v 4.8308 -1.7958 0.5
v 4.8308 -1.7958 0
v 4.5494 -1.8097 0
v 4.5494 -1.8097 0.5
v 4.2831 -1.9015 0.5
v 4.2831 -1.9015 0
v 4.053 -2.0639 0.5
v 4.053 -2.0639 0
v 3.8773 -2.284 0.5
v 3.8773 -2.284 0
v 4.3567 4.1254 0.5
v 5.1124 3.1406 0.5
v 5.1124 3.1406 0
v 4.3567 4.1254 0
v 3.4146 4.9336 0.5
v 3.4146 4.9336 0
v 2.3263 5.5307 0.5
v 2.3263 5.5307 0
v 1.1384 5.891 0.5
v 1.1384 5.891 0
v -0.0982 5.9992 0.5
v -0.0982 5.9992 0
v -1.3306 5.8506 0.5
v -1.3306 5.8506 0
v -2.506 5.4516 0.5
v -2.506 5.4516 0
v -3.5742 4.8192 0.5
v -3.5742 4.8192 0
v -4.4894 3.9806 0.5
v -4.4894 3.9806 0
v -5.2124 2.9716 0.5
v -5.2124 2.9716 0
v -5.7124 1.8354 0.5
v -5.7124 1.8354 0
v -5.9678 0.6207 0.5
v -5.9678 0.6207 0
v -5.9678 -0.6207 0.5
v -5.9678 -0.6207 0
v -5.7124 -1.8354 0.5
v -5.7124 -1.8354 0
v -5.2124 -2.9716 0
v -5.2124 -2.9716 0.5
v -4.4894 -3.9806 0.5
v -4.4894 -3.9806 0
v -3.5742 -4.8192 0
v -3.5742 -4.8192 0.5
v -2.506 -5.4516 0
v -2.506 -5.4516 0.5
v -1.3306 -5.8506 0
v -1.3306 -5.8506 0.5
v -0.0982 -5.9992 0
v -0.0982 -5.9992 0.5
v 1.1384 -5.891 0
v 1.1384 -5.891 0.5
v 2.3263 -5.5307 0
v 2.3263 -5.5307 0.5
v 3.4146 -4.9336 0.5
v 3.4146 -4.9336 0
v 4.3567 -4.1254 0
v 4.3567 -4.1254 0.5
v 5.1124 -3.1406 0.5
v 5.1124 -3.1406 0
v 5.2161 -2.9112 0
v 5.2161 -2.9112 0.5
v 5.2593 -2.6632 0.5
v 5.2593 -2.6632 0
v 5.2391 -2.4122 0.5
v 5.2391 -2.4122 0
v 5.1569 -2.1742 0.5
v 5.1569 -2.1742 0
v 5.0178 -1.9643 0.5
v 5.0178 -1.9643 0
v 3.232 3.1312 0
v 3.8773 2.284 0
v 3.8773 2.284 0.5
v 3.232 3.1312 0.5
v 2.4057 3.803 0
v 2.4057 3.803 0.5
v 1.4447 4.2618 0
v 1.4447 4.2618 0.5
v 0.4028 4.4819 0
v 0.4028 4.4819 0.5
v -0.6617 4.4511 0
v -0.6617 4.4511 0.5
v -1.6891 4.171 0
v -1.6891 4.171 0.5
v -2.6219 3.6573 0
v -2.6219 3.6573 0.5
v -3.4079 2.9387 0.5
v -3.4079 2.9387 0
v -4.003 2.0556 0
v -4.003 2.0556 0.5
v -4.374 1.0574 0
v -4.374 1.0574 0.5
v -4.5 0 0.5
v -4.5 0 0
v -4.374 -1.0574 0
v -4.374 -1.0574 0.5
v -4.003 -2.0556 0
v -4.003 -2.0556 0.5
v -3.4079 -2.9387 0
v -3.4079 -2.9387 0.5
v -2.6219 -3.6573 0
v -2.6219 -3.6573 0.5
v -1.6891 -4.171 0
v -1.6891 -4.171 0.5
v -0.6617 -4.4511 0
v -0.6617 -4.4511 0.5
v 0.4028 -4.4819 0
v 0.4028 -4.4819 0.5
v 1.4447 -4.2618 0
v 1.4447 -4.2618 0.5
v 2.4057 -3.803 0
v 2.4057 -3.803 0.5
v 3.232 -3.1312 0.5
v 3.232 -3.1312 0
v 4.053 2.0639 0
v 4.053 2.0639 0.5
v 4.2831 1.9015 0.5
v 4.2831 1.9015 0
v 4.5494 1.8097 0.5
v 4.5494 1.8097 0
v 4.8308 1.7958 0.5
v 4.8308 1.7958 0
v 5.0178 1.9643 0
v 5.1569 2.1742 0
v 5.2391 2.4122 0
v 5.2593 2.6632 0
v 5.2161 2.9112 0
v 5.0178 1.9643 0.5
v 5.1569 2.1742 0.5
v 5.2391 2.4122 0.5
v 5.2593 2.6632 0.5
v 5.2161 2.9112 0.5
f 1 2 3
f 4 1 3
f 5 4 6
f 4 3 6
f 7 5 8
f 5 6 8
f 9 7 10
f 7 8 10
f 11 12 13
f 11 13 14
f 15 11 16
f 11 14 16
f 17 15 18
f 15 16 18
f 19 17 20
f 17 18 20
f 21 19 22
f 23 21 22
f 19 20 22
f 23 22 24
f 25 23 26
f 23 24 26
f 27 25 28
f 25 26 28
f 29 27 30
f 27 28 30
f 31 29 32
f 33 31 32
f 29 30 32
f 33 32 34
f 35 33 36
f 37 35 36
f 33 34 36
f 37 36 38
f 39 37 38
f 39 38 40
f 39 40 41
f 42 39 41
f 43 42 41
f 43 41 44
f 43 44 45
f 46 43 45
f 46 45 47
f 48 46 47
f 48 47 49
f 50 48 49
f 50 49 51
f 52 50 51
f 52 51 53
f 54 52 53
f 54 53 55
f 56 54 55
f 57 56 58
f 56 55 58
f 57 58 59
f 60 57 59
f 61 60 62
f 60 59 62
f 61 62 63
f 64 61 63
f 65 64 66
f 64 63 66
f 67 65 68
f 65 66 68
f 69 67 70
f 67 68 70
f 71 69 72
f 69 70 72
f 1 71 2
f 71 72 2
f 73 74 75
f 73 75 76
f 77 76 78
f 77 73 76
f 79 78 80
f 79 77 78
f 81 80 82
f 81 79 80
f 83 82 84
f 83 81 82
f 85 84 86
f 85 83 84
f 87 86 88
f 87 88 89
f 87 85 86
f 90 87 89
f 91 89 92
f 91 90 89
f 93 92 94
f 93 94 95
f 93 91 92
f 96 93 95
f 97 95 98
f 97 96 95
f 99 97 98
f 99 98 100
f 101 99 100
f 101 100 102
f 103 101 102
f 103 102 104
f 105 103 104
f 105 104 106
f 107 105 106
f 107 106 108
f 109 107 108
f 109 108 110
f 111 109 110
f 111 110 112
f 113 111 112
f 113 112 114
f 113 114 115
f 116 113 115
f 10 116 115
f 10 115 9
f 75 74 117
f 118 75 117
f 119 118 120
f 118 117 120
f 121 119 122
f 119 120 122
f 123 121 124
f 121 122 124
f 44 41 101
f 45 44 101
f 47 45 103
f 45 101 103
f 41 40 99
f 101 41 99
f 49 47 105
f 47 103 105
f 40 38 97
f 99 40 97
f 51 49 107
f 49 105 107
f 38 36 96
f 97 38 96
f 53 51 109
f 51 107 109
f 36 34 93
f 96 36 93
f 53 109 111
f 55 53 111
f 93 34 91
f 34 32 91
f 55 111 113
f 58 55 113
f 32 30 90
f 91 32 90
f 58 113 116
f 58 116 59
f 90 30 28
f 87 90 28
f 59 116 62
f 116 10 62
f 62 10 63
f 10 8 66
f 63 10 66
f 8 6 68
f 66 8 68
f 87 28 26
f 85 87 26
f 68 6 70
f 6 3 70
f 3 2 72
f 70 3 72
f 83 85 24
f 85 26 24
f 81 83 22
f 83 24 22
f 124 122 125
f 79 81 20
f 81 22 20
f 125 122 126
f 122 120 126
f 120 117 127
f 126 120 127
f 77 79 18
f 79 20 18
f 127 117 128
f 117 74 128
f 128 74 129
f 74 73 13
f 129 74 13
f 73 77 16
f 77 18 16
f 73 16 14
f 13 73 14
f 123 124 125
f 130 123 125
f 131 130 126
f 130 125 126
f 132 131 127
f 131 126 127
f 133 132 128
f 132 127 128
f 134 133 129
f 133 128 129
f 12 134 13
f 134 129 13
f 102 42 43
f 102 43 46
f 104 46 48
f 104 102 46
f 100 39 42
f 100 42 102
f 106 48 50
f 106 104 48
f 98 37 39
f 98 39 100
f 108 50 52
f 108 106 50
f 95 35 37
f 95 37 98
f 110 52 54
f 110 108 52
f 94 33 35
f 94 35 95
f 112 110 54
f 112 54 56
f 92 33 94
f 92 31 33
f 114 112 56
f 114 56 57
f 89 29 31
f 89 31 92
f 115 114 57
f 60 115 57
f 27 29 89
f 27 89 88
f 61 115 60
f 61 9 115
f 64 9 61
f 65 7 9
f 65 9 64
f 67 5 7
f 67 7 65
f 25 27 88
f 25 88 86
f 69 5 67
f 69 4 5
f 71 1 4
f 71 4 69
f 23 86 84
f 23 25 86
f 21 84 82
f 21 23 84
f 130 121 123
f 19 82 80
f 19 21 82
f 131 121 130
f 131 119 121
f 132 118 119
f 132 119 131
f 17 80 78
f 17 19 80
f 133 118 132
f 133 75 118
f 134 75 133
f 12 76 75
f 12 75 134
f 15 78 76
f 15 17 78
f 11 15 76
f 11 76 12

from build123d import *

# Parameters (mm, degrees)
SKETCH1_R           = 6
SKETCH1_R_2         = 4.5
BOSS_EXTRUDE1_DEPTH = 0.5
CUT_EXTRUDE1_START  = -0.5
CUT_EXTRUDE1_DEPTH  = 0.5
FILLET1_R           = 1


with BuildPart() as part:
    # Sketch1 → Boss-Extrude1 (new body)
    with BuildSketch(Plane.XY):
        Circle(SKETCH1_R)
        Circle(SKETCH1_R_2, mode=Mode.SUBTRACT)
    extrude(amount=BOSS_EXTRUDE1_DEPTH)

    # Sketch2 → Cut-Extrude1 (cut)
    with BuildSketch(Plane.XY.offset(0.5).offset(CUT_EXTRUDE1_START)):
        with BuildLine():
            Line((5.637224766, 2.054676846), (4.227918574, 1.541007634))
            ThreePointArc((4.227918574, 1.541007634), (4.431457637, 0.782421375), (4.5, 0))
            ThreePointArc((4.5, 0), (4.431457637, -0.782421375), (4.227918574, -1.541007634))
            Line((4.227918574, -1.541007634), (5.637224766, -2.054676846))
            ThreePointArc((5.637224766, -2.054676846), (5.908610183, -1.0432285), (6, 0))
            ThreePointArc((6, 0), (5.908610183, 1.0432285), (5.637224766, 2.054676846))
        make_face()
    extrude(amount=CUT_EXTRUDE1_DEPTH, mode=Mode.SUBTRACT)

    # Fillet1
    # the kernel refuses this fillet: 1 mm, written as the material it takes off along each edge
    with BuildSketch(Plane(origin=(4.227918574, -1.541007634, -2.270817283), x_dir=(0.9395374609645726, -0.3424461409393371, 0), z_dir=(0, 0, 1))) as fillet1_piece_1:
        with BuildLine():
            CenterArc((0.908326913, -1), FILLET1_R, 90, 79.524318304)
            ThreePointArc((-0.075005253, -0.818181818), (-0.018790545, -0.410806303), (0, 0))
            Line((0, 0), (0.908326913, 0))
        make_face()
    extrude(amount=5.041634566, mode=Mode.SUBTRACT)
    with BuildSketch(Plane(origin=(5.637224766, -2.054676846, -3.01526886), x_dir=(-0.4351439810441928, -0.9003608808477915, 0), z_dir=(0, 0, 1))) as fillet1_piece_2:
        with BuildLine():
            CenterArc((1.105598582, -0.994936153), FILLET1_R, 84.231520484, 101.536959033)
            Line((0.110662429, -1.095445115), (0, 0))
            ThreePointArc((0, 0), (0.603053772, 0.030383082), (1.206107544, 0))
        make_face()
    extrude(amount=6.53053772, mode=Mode.SUBTRACT)
    with BuildSketch(Plane(origin=(4.227918574, 1.541007634, -2.270817283), x_dir=(0.9395374609645728, 0.3424461409393367, 0), z_dir=(0, 0, 1))) as fillet1_piece_3:
        with BuildLine():
            CenterArc((0.908326913, 1), FILLET1_R, 190.475681696, 79.524318304)
            ThreePointArc((-0.075005253, 0.818181818), (-0.018790545, 0.410806303), (0, 0))
            Line((0, 0), (0.908326913, 0))
        make_face()
    extrude(amount=5.041634566, mode=Mode.SUBTRACT)
    with BuildSketch(Plane(origin=(5.637224766, 2.054676846, -3.01526886), x_dir=(-0.43514398104419194, 0.9003608808477921, 0), z_dir=(0, 0, 1))) as fillet1_piece_4:
        with BuildLine():
            CenterArc((1.105598582, 0.994936153), FILLET1_R, 174.231520484, 101.536959033)
            Line((0.110662429, 1.095445115), (0, 0))
            ThreePointArc((0, 0), (0.603053772, -0.030383082), (1.206107544, 0))
        make_face()
    extrude(amount=6.53053772, mode=Mode.SUBTRACT)


solid = part.part
